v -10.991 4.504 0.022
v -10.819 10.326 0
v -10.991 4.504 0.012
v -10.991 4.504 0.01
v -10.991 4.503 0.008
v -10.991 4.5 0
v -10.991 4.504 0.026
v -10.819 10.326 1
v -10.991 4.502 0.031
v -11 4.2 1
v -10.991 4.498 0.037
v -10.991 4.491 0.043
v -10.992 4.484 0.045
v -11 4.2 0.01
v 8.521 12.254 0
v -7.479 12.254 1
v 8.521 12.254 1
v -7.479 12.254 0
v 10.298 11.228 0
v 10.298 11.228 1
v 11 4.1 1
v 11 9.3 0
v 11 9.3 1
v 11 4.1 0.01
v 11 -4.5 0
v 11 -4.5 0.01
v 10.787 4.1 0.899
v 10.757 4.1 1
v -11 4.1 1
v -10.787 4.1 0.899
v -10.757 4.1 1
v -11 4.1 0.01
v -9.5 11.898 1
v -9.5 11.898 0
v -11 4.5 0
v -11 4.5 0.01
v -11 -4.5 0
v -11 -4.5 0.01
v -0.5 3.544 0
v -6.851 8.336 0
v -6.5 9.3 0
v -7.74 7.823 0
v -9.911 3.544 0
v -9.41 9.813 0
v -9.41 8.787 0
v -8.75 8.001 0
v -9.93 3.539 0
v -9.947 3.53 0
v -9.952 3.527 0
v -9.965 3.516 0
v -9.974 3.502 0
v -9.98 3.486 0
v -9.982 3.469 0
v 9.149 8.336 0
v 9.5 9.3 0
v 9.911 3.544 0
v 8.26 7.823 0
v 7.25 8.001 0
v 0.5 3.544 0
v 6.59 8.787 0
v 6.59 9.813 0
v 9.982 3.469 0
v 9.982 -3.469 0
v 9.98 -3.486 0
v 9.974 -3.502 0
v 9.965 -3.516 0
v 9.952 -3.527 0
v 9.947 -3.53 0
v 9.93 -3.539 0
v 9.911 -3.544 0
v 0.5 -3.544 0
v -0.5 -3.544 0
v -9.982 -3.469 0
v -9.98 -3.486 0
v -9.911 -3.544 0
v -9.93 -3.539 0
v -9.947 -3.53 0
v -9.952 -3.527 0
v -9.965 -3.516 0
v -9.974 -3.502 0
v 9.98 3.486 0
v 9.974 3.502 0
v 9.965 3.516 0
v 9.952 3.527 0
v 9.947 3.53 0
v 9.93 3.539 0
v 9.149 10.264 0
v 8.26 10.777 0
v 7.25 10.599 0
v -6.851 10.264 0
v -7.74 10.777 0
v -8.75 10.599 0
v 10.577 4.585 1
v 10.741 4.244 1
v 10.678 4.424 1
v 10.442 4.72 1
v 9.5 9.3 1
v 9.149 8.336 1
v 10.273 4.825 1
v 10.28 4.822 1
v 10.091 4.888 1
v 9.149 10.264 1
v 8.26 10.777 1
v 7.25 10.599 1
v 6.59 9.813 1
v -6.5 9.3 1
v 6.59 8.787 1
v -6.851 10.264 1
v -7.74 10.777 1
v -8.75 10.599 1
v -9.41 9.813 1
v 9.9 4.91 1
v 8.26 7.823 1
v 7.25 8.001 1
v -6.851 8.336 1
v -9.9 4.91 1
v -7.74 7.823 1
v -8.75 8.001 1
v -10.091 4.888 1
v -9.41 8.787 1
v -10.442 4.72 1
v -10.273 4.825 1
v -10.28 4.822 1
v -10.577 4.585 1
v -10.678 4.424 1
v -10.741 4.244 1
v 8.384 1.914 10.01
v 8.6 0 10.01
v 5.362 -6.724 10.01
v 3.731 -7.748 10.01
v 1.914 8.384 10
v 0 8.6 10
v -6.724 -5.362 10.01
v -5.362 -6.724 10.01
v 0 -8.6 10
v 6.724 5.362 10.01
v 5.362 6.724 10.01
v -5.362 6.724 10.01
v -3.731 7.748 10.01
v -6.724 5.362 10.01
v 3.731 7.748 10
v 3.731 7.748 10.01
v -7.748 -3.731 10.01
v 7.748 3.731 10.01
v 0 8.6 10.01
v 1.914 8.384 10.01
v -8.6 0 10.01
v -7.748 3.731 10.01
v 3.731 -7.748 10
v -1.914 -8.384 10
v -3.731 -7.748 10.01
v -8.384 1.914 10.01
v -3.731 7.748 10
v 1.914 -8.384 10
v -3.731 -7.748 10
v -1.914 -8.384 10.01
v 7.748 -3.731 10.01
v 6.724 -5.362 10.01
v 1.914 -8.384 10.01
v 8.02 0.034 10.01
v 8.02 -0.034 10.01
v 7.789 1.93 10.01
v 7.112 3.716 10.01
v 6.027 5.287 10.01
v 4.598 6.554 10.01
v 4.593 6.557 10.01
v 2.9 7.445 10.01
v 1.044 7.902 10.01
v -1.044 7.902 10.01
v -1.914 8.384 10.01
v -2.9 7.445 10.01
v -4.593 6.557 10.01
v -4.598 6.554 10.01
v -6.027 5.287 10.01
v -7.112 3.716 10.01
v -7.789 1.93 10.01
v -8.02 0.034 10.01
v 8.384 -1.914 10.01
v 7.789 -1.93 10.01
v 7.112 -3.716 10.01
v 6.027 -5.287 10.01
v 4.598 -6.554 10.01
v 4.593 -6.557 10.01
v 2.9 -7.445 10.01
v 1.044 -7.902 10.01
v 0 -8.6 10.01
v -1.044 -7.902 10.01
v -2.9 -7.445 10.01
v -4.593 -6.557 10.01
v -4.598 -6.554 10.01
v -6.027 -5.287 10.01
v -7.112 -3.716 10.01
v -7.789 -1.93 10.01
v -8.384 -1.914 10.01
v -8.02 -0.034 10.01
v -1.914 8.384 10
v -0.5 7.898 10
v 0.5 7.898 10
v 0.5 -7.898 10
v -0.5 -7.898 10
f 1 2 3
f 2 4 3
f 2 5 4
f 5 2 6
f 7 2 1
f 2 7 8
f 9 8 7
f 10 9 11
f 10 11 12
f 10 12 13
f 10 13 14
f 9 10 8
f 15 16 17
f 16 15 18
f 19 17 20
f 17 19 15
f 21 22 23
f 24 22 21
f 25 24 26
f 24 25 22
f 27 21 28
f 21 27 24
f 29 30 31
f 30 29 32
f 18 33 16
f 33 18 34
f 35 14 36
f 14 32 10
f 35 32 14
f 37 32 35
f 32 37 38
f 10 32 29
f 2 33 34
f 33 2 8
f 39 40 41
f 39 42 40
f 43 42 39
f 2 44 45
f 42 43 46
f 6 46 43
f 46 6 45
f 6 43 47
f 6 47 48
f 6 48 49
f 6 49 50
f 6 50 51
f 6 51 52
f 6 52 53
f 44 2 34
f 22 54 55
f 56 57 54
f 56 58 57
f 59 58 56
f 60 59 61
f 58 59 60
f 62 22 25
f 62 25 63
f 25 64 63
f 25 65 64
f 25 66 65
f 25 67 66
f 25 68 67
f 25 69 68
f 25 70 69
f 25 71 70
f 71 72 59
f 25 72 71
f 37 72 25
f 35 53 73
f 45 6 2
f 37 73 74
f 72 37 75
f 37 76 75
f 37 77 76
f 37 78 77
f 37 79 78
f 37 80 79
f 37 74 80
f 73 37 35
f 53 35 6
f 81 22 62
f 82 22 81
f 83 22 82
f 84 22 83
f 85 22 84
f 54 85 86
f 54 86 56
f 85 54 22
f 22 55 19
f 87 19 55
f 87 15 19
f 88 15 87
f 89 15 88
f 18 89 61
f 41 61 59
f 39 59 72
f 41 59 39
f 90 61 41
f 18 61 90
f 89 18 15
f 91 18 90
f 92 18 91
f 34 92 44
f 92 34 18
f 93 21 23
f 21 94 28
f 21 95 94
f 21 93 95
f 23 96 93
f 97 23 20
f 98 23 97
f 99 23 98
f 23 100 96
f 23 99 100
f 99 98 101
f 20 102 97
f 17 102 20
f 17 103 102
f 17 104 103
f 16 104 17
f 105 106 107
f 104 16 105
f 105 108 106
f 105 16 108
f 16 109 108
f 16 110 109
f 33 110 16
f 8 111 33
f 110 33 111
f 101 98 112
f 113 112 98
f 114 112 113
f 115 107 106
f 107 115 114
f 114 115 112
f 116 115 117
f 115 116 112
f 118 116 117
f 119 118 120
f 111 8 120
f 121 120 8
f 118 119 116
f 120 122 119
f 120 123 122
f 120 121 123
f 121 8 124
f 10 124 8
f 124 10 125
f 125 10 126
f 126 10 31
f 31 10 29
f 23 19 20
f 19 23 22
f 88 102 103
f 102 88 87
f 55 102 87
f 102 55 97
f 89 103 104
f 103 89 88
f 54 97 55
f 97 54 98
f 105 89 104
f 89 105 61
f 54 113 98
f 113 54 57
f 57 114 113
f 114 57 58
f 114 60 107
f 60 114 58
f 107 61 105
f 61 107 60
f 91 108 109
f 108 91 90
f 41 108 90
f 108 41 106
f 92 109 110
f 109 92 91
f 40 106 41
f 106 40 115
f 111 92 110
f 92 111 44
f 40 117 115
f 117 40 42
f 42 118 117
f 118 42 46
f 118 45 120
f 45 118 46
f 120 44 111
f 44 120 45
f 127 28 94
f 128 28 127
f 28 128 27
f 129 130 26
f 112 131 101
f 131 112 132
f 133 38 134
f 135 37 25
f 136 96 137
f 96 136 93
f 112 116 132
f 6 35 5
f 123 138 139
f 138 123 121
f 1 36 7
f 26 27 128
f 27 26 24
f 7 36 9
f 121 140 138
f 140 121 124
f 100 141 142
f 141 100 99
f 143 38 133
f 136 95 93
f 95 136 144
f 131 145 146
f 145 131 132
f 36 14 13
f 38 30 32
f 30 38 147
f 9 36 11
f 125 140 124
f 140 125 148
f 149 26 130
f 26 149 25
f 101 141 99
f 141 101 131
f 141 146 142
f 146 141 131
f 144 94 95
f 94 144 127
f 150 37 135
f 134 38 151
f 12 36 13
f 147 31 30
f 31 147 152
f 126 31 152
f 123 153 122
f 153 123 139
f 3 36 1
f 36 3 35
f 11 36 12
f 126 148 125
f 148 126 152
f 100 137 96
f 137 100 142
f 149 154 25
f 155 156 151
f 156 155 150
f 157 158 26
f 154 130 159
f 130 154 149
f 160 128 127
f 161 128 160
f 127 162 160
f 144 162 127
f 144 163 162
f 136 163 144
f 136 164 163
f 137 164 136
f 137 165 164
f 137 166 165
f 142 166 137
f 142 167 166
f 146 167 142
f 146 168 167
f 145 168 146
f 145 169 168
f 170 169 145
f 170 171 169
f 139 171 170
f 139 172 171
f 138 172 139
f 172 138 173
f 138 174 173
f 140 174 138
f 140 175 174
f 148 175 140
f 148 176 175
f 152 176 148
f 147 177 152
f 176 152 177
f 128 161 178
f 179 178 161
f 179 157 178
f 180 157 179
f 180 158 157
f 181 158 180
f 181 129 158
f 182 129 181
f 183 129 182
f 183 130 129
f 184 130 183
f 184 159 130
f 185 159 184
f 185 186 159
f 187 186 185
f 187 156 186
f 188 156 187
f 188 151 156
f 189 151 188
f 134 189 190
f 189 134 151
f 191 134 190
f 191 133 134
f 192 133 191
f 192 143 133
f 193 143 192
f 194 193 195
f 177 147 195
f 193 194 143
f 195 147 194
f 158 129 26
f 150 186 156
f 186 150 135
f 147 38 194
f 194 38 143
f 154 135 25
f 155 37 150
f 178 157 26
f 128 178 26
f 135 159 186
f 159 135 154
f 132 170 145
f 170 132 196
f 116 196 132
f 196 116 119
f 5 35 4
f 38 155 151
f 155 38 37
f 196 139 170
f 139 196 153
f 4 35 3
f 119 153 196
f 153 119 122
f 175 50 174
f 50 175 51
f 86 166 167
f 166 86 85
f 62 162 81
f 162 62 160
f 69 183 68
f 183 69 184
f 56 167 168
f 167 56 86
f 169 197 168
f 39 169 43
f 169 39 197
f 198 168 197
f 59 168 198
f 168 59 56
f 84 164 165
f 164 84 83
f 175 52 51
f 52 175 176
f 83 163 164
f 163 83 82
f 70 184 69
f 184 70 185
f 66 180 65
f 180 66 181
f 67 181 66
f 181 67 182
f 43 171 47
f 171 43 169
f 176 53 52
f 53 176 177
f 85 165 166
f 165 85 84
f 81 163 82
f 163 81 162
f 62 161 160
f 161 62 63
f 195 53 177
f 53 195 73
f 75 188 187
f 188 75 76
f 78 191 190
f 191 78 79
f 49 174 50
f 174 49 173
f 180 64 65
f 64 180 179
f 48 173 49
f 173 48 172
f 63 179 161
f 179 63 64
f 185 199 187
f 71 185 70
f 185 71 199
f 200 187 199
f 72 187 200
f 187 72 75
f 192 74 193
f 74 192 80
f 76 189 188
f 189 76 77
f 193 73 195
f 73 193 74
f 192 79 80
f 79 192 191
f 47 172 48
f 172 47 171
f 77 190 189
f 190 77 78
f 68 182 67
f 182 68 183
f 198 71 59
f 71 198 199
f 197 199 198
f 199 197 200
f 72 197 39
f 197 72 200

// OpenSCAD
sHeight = 10;


module sInput(type) {
	linear_extrude(height = 0.01) {
		wall = 1;
	
		sSpaceX = 22 - wall * 2;
		sSpaceY = 7;
		
		if(type == "OUTER") 
			translate([-sSpaceX/2 - wall, -sSpaceY/2 - wall]) square([sSpaceX + wall*2, sSpaceY + wall*2]);
		else if(type == "INNER")
			translate([-sSpaceX/2, -sSpaceY/2]) square([sSpaceX, sSpaceY]);
	}
}

module sOutput(type) {
		linear_extrude(height = 0.01) {
		wall = 0.6;
		
		radius = 8; 
		
		if(type == "INNER")
			circle(r = radius);
		else if(type == "OUTER")
			circle(r = radius + wall);
	}
}

module shell() {
	difference() {
		hull() {
			sInput("OUTER");
			translate([0, 0, sHeight]) sOutput("OUTER");
		}
		
		hull() {
			translate([0, 0, -0.1]) sInput("INNER");
			translate([0, 0, sHeight + 0.1]) sOutput("INNER");
		}
	}
}

module cPlate() {
	shiftUp = 4.1;
	
	sizeX = 22;
	sizeY = 12.3;
	
	$fn = 9;
	
	difference() {
		hull() {
			translate([sizeX/2 - 3, sizeY - 3, 0]) cylinder(r = 3, h = 1);
			translate([-sizeX/2 + 3, sizeY - 3, 0]) cylinder(r = 3, h = 1);
			
			translate([-sizeX/2, shiftUp, 0]) cube([sizeX, 0.1, 1]);
		}
		translate([sizeX/2 - 3, sizeY - 3, 0]) cylinder(r = 1.5, h = 1);
		translate([-sizeX/2 + 3, sizeY - 3, 0]) cylinder(r = 1.5, h = 1);
	}
}

module lightBlockade() {
	wall = 1;
	ySize = 50;

	height = sHeight;
	
	intersection() {
		hull() {
			sInput("OUTER");
			translate([0, 0, sHeight]) sOutput("OUTER");
		}
		
		translate([-wall/2, -ySize/2, 0]) cube([wall, ySize, height]);
	}
}

cPlate();
shell();
lightBlockade();
